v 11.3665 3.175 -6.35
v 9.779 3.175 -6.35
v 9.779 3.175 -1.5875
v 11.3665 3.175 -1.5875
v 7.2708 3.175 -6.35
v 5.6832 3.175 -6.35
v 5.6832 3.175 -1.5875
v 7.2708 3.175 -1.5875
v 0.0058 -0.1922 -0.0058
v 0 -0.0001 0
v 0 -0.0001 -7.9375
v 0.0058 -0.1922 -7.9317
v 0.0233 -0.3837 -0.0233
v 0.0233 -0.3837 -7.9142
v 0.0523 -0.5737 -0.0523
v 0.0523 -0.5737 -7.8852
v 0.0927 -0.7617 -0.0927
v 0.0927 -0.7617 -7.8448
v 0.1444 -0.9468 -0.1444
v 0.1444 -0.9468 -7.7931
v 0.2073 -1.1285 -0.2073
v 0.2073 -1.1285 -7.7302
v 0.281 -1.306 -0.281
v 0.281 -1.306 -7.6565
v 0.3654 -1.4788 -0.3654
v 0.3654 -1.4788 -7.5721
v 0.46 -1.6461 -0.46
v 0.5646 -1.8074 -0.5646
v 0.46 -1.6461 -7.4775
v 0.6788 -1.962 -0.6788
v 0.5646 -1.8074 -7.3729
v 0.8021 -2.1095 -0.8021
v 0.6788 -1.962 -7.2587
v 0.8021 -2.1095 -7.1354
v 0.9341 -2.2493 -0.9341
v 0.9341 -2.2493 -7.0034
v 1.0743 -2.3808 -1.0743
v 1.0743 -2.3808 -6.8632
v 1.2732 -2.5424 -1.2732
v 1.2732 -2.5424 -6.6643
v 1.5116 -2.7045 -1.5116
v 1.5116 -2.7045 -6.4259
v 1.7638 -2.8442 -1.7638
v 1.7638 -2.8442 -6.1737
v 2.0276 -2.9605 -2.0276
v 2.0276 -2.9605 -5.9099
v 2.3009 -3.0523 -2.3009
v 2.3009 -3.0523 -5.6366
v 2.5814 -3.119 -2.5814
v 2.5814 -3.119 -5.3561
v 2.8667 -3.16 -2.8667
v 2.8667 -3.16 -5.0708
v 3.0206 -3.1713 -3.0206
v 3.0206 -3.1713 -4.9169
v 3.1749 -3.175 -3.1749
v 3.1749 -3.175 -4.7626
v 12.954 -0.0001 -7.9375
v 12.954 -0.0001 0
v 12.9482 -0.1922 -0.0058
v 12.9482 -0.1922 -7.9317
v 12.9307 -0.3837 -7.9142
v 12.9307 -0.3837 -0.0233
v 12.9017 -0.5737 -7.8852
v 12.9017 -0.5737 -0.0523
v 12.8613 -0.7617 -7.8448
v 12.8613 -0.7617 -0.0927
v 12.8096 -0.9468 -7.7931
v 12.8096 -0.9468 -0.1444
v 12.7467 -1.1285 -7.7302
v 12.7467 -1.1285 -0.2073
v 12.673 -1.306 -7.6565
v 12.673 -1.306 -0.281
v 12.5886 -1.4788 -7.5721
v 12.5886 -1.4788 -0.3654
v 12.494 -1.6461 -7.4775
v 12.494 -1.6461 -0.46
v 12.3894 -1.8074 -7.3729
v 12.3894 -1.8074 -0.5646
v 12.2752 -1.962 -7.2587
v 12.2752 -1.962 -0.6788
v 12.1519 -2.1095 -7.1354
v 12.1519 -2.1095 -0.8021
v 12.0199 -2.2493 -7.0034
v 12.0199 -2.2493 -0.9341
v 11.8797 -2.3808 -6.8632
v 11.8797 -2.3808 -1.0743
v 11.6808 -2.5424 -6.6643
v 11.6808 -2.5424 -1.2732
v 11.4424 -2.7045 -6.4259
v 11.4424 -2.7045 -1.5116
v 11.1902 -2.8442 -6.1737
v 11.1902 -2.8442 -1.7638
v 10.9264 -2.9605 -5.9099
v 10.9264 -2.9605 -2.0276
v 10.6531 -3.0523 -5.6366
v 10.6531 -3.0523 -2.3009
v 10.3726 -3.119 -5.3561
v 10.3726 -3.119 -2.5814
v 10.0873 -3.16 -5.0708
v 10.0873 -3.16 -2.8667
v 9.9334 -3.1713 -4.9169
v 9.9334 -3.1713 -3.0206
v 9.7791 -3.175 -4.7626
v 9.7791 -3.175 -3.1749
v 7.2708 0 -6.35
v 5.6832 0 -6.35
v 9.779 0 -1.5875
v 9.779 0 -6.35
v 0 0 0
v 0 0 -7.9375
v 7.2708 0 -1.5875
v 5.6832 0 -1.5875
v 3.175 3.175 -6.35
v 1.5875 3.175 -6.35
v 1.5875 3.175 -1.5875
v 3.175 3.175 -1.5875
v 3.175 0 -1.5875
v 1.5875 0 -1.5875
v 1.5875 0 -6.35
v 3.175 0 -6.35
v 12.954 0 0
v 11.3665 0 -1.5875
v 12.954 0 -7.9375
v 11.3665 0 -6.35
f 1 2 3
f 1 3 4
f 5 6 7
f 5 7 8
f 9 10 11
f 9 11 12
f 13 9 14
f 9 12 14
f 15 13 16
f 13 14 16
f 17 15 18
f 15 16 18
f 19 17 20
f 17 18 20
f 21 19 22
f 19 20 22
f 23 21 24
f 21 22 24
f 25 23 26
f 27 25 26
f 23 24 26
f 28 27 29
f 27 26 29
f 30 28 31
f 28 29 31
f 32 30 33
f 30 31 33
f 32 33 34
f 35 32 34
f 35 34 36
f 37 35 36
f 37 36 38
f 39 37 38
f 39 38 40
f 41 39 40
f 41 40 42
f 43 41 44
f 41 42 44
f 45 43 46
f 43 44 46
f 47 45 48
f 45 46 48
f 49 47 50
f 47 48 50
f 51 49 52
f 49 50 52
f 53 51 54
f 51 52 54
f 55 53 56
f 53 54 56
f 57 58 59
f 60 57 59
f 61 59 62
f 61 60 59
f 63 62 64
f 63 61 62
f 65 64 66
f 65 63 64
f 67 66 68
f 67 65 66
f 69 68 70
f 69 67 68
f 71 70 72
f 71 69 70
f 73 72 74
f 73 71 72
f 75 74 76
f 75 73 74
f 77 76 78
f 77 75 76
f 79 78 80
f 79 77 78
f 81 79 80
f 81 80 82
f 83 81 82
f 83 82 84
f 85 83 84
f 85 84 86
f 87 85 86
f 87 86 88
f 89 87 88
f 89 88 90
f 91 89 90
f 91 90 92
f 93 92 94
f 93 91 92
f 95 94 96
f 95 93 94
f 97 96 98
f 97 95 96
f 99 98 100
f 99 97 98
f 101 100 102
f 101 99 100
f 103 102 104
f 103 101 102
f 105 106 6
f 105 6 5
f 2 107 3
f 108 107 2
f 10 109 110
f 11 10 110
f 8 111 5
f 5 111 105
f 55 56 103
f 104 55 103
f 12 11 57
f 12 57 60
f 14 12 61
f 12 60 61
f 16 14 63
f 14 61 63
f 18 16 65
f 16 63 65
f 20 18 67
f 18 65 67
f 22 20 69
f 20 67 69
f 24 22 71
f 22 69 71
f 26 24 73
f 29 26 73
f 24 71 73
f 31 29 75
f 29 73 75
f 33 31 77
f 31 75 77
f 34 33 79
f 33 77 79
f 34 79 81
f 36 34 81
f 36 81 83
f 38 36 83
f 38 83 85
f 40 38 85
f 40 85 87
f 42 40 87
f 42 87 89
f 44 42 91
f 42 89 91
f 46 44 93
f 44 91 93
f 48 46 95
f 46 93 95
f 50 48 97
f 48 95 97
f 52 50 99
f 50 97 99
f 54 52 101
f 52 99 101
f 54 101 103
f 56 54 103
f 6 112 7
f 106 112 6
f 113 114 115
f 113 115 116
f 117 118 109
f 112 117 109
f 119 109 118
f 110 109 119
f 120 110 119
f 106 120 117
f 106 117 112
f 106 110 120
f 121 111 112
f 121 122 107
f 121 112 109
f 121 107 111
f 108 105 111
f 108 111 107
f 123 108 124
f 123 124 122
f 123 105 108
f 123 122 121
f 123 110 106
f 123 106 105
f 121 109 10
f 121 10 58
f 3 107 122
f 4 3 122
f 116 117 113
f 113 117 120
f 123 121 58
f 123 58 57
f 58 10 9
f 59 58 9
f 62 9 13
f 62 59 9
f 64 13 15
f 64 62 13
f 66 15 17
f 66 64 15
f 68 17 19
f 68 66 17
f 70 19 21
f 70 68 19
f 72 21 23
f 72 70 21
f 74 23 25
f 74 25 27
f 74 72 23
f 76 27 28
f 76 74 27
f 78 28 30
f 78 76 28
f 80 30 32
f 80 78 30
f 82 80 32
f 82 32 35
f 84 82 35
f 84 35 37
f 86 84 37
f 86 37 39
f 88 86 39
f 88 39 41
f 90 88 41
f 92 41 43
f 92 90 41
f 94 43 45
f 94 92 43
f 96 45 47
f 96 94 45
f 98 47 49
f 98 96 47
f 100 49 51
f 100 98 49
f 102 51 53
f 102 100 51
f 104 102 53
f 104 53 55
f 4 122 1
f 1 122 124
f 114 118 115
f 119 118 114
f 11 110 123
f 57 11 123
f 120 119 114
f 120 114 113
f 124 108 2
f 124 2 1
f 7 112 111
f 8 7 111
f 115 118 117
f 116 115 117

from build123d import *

# Parameters (mm, degrees)
SKETCH1_W           = 12.954
SKETCH1_H           = 7.9375
SKETCH1_W_2         = 1.5875
SKETCH1_H_2         = 4.7625
BOSS_EXTRUDE1_DEPTH = 3.175
SKETCH1_3_W         = 1.5875
SKETCH1_3_H         = 4.7625
BOSS_EXTRUDE2_DEPTH = 3.175
FILLET1_R           = 3.175


with BuildPart() as part:
    # Sketch1 → Boss-Extrude1 (new body)
    # profile 1 of 4: a face of its own
    with BuildSketch(Plane(origin=(0, 0, 0), x_dir=(1, 0, 0), z_dir=(0, 1, 0))):
        with Locations((6.477, 3.96875)):
            Rectangle(SKETCH1_W, SKETCH1_H)
        with Locations((10.57275, 3.96875)):
            Rectangle(SKETCH1_W_2, SKETCH1_H_2, mode=Mode.SUBTRACT)
        with Locations((6.477, 3.96875)):
            Rectangle(SKETCH1_W_2, SKETCH1_H_2, mode=Mode.SUBTRACT)
        with Locations((2.38125, 3.96875)):
            Rectangle(SKETCH1_W_2, SKETCH1_H_2, mode=Mode.SUBTRACT)
    # profile 2 of 4: a face of its own
    with BuildSketch(Plane(origin=(0, 0, 0), x_dir=(1, 0, 0), z_dir=(0, 1, 0))):
        with Locations((2.38125, 3.96875)):
            Rectangle(SKETCH1_W_2, SKETCH1_H_2)
    # profile 3 of 4: a face of its own
    with BuildSketch(Plane(origin=(0, 0, 0), x_dir=(1, 0, 0), z_dir=(0, 1, 0))):
        with Locations((6.477, 3.96875)):
            Rectangle(SKETCH1_W_2, SKETCH1_H_2)
    # profile 4 of 4: a face of its own
    with BuildSketch(Plane(origin=(0, 0, 0), x_dir=(1, 0, 0), z_dir=(0, 1, 0))):
        with Locations((10.57275, 3.96875)):
            Rectangle(SKETCH1_W_2, SKETCH1_H_2)
    extrude(amount=-BOSS_EXTRUDE1_DEPTH)

    # Sketch1<3> → Boss-Extrude2 (add)
    with BuildSketch(Plane(origin=(0, 0, 0), x_dir=(1, 0, 0), z_dir=(0, 1, 0))):
        with Locations((2.38125, 3.96875)):
            Rectangle(SKETCH1_3_W, SKETCH1_3_H)
        with Locations((6.477, 3.96875)):
            Rectangle(SKETCH1_3_W, SKETCH1_3_H)
        with Locations((10.57275, 3.96875)):
            Rectangle(SKETCH1_3_W, SKETCH1_3_H)
    extrude(amount=BOSS_EXTRUDE2_DEPTH)

    # Fillet1
    fillet1_edges = [part.edges().sort_by_distance(p)[0] for p in [
        (12.954, -3.175, -3.96875),
        (6.477, -3.175, -7.9375),
        (0, -3.175, -3.96875),
        (6.477, -3.175, 0),
    ]]
    fillet(fillet1_edges, radius=FILLET1_R - 0.0001)  # a hair under: the kernel refuses the full size


solid = part.part
